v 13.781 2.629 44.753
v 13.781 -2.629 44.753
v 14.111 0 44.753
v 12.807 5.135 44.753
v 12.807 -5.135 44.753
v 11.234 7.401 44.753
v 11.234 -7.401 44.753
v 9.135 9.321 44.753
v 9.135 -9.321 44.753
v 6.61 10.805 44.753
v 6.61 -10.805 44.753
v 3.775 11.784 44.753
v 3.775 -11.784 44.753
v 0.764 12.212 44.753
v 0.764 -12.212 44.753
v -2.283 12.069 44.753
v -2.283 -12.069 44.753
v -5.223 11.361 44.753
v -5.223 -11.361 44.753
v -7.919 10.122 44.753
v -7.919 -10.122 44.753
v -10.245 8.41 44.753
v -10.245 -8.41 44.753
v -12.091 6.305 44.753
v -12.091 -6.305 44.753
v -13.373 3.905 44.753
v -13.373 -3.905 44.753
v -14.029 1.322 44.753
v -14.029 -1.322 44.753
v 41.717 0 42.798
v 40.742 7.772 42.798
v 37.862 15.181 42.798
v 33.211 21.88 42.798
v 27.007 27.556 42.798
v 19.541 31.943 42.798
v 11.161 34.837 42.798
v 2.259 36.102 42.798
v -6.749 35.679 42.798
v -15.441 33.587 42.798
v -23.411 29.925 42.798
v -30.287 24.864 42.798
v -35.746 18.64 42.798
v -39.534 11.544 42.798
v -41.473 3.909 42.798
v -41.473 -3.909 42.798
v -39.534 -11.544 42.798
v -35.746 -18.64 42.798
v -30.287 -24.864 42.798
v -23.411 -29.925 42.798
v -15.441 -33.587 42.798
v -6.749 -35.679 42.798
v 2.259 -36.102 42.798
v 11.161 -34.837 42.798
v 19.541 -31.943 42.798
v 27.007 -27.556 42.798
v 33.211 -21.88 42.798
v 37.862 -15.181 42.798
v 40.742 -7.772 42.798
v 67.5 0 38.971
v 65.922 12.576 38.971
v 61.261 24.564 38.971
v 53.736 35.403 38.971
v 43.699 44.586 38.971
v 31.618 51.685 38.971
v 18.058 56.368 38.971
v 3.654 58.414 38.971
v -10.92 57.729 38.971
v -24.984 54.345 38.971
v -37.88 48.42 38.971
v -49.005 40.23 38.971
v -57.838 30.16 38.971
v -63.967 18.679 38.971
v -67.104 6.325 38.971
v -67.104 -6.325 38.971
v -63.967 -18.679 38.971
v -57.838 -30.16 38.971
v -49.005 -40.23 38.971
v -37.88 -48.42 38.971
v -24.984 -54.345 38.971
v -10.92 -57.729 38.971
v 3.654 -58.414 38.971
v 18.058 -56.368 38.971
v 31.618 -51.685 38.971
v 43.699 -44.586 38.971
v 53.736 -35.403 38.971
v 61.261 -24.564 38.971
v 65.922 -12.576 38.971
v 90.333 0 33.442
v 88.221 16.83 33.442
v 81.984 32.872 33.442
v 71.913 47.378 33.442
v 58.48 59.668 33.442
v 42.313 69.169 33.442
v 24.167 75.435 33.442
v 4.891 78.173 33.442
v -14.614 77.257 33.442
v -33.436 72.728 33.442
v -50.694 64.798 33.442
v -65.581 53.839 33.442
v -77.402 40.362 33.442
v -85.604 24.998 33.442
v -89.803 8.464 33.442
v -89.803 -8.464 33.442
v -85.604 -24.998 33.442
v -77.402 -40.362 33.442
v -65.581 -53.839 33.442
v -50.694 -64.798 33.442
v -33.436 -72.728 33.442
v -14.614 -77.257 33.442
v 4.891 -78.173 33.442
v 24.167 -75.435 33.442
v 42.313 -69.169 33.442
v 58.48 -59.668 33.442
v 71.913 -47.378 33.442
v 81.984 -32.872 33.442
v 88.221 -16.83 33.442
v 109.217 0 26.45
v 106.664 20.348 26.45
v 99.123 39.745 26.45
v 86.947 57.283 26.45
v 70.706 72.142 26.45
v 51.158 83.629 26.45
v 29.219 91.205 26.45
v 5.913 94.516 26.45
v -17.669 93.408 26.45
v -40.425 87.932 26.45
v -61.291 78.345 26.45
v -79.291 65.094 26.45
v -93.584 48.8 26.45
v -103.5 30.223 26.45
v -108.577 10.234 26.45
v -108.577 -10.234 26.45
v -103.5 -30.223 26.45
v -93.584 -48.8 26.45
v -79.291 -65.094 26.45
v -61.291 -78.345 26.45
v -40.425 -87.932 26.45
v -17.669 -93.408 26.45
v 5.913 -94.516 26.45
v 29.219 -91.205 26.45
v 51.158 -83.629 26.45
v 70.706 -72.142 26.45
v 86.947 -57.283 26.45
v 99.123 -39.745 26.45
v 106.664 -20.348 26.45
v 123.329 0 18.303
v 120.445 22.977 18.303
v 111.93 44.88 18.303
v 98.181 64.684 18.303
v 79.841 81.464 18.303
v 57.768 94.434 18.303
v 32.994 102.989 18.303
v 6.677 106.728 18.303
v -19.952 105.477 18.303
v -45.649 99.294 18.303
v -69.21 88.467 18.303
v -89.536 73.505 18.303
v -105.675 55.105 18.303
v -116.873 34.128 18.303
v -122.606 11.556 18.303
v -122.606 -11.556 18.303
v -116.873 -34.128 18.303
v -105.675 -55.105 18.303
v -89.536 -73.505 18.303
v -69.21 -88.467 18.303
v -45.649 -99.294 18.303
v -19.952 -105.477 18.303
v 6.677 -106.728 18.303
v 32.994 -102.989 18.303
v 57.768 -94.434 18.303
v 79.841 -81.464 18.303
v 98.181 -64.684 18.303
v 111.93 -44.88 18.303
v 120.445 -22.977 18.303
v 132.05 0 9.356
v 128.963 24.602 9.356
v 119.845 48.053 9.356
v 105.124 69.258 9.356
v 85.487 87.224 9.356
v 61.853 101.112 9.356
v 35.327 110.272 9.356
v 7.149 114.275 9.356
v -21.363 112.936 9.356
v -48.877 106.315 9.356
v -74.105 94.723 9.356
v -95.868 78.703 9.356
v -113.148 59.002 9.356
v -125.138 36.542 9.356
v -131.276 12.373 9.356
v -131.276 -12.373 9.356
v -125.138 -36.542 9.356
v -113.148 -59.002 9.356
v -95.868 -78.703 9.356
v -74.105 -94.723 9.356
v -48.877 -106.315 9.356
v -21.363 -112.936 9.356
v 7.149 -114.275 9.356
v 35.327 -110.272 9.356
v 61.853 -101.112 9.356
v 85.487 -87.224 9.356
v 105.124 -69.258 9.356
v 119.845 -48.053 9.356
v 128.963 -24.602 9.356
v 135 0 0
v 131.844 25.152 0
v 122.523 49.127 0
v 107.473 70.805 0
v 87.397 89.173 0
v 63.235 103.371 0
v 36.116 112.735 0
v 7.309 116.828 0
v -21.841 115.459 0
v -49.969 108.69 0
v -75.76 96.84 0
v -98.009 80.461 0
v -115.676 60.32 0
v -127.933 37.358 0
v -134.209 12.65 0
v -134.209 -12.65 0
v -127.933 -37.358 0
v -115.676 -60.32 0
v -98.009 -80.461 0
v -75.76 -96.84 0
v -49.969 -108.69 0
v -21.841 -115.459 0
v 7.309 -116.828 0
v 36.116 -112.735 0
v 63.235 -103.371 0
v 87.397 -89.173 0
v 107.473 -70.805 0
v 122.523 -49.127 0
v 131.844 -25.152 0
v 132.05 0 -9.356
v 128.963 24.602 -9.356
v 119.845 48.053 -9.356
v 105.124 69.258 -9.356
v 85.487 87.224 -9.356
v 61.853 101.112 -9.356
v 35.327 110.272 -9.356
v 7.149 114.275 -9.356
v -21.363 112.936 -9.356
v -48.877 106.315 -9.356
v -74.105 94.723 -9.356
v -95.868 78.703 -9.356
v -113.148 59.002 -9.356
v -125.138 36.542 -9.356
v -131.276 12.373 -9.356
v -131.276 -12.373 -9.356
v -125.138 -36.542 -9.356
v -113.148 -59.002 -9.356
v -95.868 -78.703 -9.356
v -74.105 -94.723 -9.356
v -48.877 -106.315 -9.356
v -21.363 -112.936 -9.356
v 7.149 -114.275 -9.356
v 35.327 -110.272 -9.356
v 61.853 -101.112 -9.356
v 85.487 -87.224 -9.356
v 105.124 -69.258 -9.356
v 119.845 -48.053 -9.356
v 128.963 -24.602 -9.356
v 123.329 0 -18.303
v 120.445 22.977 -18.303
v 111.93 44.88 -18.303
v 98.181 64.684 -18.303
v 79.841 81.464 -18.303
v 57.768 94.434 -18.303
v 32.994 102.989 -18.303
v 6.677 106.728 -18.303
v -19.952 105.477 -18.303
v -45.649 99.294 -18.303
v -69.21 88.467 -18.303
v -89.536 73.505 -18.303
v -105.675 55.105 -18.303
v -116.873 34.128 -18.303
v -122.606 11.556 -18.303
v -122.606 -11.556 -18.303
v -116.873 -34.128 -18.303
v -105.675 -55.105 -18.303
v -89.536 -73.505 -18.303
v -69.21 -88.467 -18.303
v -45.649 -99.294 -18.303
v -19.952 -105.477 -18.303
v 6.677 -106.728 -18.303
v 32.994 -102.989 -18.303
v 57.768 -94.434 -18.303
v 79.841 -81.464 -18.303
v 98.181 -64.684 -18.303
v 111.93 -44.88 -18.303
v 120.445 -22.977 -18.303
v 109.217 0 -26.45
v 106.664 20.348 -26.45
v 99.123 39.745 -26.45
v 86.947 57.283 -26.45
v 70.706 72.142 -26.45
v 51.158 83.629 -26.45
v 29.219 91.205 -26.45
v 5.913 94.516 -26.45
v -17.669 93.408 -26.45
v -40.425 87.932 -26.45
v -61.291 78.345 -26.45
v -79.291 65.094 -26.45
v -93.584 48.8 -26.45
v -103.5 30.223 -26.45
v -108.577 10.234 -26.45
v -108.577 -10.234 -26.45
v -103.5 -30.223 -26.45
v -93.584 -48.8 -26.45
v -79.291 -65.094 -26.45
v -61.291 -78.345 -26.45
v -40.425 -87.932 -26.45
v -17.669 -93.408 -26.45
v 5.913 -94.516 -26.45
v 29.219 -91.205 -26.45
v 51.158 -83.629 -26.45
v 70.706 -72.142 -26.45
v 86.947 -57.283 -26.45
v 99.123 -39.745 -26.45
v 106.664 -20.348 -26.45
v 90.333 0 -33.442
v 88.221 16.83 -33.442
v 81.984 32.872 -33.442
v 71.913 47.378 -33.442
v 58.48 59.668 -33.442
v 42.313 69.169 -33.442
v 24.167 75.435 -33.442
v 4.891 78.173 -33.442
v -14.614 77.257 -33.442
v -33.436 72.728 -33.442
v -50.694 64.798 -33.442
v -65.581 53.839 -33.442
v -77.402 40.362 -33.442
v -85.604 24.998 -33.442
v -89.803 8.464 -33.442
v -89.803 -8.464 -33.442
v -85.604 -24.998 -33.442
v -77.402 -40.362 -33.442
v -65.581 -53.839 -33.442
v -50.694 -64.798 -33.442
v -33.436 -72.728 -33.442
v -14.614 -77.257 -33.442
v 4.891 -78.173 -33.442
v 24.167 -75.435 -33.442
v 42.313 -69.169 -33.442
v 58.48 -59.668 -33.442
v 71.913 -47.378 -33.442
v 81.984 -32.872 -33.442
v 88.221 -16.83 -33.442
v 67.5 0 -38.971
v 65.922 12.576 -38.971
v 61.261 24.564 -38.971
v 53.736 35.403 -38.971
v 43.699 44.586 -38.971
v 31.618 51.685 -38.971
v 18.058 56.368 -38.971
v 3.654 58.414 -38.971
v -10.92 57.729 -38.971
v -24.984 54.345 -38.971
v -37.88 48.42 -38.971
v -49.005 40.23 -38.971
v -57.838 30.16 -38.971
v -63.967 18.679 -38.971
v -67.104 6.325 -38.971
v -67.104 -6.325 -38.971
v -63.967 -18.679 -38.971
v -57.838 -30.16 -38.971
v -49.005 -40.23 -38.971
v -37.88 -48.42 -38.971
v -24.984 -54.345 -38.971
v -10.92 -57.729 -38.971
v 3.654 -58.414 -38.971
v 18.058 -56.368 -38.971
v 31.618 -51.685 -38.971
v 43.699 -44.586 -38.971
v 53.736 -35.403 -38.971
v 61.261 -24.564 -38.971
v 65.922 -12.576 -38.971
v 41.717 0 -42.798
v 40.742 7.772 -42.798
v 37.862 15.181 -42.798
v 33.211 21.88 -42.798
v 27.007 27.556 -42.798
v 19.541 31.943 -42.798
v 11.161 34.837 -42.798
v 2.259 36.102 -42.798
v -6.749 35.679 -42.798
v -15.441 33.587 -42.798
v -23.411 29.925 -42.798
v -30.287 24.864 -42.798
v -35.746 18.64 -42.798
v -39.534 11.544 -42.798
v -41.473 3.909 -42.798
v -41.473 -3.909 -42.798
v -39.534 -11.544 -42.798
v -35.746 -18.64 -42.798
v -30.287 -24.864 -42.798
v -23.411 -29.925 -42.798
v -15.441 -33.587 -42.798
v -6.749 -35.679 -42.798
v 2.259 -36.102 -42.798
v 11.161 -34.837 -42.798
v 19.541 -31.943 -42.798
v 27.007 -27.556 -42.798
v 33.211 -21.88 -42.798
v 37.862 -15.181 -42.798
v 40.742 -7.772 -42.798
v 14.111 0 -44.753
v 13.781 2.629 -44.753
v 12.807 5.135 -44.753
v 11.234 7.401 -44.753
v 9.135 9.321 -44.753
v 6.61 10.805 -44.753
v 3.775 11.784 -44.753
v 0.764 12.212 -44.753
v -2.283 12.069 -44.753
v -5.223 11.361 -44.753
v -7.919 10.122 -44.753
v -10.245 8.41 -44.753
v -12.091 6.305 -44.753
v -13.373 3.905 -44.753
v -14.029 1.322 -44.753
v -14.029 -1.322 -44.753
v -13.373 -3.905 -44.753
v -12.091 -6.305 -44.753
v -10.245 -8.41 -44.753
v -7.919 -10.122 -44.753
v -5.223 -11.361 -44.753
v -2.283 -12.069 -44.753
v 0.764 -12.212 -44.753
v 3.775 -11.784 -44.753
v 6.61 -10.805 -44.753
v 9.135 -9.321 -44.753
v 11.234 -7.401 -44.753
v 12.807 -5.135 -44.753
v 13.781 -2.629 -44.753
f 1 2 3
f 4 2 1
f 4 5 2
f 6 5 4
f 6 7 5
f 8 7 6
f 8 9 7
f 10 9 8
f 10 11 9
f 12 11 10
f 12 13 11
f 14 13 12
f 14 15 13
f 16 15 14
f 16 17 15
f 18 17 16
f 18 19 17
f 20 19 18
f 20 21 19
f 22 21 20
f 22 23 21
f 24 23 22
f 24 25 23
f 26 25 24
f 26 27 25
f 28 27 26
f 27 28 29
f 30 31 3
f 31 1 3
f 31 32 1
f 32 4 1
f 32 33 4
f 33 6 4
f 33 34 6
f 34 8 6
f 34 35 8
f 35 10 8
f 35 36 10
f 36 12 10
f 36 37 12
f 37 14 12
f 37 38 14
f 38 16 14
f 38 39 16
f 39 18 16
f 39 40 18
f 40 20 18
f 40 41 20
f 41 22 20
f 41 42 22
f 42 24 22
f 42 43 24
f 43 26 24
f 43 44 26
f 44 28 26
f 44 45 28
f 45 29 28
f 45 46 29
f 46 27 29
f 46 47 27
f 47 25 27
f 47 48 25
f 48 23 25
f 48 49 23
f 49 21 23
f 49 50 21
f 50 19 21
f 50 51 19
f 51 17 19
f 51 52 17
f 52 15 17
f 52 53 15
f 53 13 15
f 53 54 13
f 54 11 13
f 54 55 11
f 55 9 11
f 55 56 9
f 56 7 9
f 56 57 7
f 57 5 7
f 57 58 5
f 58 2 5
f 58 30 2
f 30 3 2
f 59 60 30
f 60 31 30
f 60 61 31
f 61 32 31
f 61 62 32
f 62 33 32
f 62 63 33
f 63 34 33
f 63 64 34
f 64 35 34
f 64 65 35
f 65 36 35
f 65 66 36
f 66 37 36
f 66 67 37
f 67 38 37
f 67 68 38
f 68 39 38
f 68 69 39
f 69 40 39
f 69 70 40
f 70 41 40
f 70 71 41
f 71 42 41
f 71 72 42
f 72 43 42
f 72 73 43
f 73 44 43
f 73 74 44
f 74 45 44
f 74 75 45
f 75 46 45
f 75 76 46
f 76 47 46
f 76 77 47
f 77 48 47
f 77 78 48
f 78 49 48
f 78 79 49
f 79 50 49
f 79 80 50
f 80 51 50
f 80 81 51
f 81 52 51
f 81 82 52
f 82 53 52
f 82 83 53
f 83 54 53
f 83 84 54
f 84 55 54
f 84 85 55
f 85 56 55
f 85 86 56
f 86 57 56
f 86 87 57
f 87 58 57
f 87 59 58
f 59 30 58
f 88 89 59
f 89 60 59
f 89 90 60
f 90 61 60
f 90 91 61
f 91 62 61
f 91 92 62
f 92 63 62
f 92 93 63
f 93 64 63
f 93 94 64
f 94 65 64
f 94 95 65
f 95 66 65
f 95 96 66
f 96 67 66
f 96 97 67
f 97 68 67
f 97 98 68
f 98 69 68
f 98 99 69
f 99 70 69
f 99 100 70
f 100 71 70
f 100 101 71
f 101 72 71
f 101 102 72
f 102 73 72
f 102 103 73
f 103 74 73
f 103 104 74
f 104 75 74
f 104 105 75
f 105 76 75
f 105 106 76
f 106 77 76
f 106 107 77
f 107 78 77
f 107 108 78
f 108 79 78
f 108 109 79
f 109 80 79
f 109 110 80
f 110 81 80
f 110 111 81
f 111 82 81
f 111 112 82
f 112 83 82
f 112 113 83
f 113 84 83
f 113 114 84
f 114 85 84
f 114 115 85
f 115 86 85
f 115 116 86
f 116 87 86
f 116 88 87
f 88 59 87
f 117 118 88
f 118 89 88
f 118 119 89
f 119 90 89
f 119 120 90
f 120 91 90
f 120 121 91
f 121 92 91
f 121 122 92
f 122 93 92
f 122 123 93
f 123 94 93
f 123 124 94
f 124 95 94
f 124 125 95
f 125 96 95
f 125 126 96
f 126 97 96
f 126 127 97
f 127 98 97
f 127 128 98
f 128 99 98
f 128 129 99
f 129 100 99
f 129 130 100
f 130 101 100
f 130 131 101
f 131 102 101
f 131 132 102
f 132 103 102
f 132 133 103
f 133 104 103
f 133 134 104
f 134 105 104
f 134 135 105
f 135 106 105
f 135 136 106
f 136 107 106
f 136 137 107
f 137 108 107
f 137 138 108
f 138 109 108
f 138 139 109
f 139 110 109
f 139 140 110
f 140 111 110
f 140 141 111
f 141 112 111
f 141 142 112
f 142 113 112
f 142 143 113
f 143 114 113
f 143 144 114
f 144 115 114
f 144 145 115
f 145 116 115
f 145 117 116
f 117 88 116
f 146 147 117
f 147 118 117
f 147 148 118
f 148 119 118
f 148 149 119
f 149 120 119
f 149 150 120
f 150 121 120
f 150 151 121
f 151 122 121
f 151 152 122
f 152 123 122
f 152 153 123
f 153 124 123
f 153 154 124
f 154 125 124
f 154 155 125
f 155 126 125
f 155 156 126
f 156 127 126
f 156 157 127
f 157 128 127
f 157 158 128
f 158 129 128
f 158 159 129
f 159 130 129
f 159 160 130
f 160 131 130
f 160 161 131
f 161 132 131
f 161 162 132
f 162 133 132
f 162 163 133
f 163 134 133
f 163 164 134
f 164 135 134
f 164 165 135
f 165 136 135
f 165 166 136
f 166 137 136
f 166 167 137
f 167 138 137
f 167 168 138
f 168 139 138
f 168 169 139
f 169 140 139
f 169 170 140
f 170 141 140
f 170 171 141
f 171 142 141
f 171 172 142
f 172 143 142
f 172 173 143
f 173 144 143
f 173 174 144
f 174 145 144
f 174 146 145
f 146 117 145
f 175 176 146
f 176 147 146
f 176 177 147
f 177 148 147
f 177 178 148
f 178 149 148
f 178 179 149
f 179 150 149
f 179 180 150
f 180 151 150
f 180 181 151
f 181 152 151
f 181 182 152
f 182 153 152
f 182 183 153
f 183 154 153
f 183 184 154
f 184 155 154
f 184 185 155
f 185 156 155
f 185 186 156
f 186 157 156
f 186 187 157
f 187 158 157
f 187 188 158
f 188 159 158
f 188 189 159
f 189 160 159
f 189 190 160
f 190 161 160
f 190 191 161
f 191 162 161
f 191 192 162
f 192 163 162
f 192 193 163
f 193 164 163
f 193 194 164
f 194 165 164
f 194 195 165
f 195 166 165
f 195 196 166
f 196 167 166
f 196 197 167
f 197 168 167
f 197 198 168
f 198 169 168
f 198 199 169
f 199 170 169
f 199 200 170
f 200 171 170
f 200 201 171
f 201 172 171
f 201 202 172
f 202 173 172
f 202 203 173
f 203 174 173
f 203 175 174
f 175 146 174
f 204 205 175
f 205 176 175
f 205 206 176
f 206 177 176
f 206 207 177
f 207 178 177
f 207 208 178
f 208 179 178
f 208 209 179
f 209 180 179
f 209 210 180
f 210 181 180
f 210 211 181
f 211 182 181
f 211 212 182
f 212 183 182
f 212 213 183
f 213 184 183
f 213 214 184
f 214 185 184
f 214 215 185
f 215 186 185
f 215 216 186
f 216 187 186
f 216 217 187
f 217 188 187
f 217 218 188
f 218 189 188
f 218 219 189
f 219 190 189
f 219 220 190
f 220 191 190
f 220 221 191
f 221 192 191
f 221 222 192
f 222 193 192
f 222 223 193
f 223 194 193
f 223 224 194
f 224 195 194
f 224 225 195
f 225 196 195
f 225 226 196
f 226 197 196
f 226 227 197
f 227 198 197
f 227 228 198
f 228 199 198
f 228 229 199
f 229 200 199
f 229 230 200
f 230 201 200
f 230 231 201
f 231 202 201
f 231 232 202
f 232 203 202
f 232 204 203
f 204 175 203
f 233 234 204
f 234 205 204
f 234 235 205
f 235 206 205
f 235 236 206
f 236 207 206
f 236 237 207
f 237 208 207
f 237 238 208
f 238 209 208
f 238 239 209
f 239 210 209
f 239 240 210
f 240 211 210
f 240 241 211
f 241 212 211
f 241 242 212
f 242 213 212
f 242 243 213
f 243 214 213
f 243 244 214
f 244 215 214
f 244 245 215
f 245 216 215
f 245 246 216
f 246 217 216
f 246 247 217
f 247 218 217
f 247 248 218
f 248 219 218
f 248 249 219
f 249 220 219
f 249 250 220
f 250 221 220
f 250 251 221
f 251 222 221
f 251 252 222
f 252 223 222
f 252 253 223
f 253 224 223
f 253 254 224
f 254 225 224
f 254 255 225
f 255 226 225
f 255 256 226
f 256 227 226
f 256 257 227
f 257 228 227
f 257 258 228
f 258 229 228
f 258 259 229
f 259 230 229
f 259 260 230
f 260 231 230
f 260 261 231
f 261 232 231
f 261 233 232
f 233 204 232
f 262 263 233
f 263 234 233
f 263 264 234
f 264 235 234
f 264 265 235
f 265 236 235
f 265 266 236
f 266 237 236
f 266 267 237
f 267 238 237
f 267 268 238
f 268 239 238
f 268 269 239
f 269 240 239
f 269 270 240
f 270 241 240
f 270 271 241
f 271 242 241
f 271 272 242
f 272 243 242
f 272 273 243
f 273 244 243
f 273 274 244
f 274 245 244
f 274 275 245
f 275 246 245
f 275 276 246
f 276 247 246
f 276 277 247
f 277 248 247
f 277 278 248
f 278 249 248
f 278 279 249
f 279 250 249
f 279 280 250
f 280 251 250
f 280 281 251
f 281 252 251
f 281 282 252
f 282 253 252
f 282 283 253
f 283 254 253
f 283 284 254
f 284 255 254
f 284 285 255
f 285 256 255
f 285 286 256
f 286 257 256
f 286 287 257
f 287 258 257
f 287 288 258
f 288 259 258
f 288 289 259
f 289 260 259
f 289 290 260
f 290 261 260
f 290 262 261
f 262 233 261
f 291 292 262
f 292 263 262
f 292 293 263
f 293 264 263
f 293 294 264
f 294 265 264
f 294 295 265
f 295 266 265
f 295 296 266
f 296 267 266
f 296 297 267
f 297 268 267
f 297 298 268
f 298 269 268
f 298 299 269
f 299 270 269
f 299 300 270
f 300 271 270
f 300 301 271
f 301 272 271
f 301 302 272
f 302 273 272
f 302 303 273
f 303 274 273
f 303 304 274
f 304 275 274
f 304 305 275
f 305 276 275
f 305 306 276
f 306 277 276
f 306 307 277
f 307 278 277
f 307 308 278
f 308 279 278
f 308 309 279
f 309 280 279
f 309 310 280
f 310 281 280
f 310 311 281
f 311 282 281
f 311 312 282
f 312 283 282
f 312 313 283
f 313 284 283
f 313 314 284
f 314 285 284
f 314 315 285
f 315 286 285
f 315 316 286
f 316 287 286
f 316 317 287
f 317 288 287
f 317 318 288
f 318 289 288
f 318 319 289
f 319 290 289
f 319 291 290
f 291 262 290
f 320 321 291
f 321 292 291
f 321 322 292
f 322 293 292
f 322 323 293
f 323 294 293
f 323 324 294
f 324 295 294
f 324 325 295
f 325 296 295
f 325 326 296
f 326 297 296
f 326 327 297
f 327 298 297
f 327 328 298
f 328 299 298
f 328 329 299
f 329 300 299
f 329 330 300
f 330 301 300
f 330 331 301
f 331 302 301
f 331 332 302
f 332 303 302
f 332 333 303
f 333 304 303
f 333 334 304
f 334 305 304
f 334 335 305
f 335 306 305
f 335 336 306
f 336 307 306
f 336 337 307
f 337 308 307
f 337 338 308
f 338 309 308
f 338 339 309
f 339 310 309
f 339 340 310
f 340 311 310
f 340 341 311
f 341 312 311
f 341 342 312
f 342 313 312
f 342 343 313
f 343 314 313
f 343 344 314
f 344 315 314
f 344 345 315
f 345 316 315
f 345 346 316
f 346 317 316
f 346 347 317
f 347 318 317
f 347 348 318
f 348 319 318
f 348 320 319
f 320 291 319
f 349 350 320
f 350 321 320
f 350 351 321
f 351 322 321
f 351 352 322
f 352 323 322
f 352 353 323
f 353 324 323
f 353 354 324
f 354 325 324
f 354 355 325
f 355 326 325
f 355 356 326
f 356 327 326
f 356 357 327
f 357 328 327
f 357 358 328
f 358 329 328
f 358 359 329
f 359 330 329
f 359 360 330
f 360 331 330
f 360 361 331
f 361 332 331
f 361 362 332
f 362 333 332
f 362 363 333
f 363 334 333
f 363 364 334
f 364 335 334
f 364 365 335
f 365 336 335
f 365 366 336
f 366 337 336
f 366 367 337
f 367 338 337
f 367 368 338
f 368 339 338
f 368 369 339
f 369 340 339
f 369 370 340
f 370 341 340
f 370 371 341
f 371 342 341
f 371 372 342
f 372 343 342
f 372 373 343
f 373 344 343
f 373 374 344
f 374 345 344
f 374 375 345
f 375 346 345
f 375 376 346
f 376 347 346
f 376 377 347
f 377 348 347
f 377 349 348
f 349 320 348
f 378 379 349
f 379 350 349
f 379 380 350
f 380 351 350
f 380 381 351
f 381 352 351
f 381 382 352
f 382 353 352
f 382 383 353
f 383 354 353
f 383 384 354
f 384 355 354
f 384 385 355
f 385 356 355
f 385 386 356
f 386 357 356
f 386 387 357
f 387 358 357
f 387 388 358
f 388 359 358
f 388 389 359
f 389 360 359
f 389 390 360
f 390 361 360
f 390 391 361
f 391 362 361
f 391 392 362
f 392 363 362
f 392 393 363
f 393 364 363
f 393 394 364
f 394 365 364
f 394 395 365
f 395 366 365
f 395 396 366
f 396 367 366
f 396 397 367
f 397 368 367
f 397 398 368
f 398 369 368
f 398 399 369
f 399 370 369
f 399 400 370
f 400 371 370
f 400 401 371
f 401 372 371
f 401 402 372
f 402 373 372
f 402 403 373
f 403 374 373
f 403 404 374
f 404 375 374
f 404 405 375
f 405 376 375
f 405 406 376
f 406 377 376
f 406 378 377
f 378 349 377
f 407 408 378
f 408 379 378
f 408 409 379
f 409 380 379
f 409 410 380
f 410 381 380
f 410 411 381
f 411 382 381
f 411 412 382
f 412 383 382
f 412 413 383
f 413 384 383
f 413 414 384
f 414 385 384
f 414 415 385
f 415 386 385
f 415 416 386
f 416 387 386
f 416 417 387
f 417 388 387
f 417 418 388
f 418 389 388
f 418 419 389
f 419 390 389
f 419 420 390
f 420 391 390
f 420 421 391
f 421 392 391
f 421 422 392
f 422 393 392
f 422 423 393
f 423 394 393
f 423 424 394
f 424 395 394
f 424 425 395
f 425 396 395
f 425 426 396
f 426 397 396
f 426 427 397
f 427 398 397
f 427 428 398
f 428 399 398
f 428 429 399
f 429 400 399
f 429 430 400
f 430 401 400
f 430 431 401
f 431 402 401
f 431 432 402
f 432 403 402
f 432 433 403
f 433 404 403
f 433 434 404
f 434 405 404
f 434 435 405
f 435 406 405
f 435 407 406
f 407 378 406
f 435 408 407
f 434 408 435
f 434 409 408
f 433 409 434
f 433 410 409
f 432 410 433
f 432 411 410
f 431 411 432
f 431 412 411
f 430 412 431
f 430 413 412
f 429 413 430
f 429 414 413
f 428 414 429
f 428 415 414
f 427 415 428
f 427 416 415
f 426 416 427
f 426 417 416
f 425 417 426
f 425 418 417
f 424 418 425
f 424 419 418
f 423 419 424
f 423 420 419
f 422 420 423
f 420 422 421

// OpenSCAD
// Generated by SolidPython 1.0.1 on 2020-07-29 00:46:52


scale(v = [15, 13, 5]) {
	sphere(r = 9);
}
/***********************************************
*********      SolidPython code:      **********
************************************************
 
# import packages: SolidPython
from solid import *
from solid.utils import *
from itertools import chain, combinations, permutations


class Resize:

    def __init__(self, scad_file):
        self.scad_file = scad_file
        #self.scad_file = import_scad(scad_file)
        # cone/cylinder param:
        self.r1 = 0
        self.r2 = 0
        self.h = 0
        # rectangular prism param:
        self.w = 0
        self.l = 0
        # ellipse param:
        self.r = 0

    # import OpenScad code (file name corresponds to shape)


    # classify shape + parameters
    def assign(self, param1, param2, param3):
        if self.scad_file == 'cone.scad':
            self.r1 = param1
            self.r2 = param2
            self.h = param3
        elif self.scad_file == 'cylinder.scad':
            self.r1 = param1
            self.r2 = param2
            self.h = param3
        elif self.scad_file == 'rectangularPrism.scad':
            self.h = param1
            self.l = param2
            self.w = param3
        else:
            self.r = param1
            self.h = param2

    # resize parameters
    def iterate(self):
        x = range(3, 20, 2)
        i = 1
        if self.scad_file == 'cone.scad':
            tempList = list(permutations(x, 2))
            for temp in tempList:
                param1 = temp[0]
                param2 = temp[1]
                filepath = 'produced_scad_files/' + 'cone' + str(param1) + '_' + str(param2) + '_' + '.scad'
                scad_render_to_file(cylinder(h=param1, r1=param2, r2=0), filepath)

        elif self.scad_file == 'cylinder.scad':
            tempList = list(permutations(x, 3))
            for temp in tempList:
                param1 = temp[0]
                param2 = temp[1]
                filepath = 'produced_scad_files/' + 'cylinder' + str(param1) + '_' + str(param2) + '_' + '.scad'
                scad_render_to_file(cylinder(h=param1, r1=param2, r2=param2), filepath)

        elif self.scad_file == 'rectangularPrism.scad':
            tempList = list(permutations(x, 3))
            for temp in tempList:
                param1 = temp[0]
                param2 = temp[1]
                param3 = temp[2]
                filepath = 'produced_scad_files/' + 'rectangularPrism' + str(param1) + '_' + str(param2) + '_' + str(
                    param3) + '.scad'
                scad_render_to_file(cube(size=(param1, param2, param3)), filepath)

        elif self.scad_file == 'ellipse.scad':
            tempList = list(permutations(x, 4))
            for temp in tempList:
                param1 = temp[0]
                param2 = temp[1]
                param3 = temp[2]
                param4 = temp[3]
                filepath = 'produced_scad_files/' + 'ellipse' + str(param1) + '_' + str(param2) + '_' + str(param3) + '_' + str(param4) + '.scad'
                scad_render_to_file(scale([param1, param2, param3])(sphere(r=param4)), filepath)

    def render_to_scadfile(self):
        scad_render_to_file(scad, 'example.scad') 
 
************************************************/
